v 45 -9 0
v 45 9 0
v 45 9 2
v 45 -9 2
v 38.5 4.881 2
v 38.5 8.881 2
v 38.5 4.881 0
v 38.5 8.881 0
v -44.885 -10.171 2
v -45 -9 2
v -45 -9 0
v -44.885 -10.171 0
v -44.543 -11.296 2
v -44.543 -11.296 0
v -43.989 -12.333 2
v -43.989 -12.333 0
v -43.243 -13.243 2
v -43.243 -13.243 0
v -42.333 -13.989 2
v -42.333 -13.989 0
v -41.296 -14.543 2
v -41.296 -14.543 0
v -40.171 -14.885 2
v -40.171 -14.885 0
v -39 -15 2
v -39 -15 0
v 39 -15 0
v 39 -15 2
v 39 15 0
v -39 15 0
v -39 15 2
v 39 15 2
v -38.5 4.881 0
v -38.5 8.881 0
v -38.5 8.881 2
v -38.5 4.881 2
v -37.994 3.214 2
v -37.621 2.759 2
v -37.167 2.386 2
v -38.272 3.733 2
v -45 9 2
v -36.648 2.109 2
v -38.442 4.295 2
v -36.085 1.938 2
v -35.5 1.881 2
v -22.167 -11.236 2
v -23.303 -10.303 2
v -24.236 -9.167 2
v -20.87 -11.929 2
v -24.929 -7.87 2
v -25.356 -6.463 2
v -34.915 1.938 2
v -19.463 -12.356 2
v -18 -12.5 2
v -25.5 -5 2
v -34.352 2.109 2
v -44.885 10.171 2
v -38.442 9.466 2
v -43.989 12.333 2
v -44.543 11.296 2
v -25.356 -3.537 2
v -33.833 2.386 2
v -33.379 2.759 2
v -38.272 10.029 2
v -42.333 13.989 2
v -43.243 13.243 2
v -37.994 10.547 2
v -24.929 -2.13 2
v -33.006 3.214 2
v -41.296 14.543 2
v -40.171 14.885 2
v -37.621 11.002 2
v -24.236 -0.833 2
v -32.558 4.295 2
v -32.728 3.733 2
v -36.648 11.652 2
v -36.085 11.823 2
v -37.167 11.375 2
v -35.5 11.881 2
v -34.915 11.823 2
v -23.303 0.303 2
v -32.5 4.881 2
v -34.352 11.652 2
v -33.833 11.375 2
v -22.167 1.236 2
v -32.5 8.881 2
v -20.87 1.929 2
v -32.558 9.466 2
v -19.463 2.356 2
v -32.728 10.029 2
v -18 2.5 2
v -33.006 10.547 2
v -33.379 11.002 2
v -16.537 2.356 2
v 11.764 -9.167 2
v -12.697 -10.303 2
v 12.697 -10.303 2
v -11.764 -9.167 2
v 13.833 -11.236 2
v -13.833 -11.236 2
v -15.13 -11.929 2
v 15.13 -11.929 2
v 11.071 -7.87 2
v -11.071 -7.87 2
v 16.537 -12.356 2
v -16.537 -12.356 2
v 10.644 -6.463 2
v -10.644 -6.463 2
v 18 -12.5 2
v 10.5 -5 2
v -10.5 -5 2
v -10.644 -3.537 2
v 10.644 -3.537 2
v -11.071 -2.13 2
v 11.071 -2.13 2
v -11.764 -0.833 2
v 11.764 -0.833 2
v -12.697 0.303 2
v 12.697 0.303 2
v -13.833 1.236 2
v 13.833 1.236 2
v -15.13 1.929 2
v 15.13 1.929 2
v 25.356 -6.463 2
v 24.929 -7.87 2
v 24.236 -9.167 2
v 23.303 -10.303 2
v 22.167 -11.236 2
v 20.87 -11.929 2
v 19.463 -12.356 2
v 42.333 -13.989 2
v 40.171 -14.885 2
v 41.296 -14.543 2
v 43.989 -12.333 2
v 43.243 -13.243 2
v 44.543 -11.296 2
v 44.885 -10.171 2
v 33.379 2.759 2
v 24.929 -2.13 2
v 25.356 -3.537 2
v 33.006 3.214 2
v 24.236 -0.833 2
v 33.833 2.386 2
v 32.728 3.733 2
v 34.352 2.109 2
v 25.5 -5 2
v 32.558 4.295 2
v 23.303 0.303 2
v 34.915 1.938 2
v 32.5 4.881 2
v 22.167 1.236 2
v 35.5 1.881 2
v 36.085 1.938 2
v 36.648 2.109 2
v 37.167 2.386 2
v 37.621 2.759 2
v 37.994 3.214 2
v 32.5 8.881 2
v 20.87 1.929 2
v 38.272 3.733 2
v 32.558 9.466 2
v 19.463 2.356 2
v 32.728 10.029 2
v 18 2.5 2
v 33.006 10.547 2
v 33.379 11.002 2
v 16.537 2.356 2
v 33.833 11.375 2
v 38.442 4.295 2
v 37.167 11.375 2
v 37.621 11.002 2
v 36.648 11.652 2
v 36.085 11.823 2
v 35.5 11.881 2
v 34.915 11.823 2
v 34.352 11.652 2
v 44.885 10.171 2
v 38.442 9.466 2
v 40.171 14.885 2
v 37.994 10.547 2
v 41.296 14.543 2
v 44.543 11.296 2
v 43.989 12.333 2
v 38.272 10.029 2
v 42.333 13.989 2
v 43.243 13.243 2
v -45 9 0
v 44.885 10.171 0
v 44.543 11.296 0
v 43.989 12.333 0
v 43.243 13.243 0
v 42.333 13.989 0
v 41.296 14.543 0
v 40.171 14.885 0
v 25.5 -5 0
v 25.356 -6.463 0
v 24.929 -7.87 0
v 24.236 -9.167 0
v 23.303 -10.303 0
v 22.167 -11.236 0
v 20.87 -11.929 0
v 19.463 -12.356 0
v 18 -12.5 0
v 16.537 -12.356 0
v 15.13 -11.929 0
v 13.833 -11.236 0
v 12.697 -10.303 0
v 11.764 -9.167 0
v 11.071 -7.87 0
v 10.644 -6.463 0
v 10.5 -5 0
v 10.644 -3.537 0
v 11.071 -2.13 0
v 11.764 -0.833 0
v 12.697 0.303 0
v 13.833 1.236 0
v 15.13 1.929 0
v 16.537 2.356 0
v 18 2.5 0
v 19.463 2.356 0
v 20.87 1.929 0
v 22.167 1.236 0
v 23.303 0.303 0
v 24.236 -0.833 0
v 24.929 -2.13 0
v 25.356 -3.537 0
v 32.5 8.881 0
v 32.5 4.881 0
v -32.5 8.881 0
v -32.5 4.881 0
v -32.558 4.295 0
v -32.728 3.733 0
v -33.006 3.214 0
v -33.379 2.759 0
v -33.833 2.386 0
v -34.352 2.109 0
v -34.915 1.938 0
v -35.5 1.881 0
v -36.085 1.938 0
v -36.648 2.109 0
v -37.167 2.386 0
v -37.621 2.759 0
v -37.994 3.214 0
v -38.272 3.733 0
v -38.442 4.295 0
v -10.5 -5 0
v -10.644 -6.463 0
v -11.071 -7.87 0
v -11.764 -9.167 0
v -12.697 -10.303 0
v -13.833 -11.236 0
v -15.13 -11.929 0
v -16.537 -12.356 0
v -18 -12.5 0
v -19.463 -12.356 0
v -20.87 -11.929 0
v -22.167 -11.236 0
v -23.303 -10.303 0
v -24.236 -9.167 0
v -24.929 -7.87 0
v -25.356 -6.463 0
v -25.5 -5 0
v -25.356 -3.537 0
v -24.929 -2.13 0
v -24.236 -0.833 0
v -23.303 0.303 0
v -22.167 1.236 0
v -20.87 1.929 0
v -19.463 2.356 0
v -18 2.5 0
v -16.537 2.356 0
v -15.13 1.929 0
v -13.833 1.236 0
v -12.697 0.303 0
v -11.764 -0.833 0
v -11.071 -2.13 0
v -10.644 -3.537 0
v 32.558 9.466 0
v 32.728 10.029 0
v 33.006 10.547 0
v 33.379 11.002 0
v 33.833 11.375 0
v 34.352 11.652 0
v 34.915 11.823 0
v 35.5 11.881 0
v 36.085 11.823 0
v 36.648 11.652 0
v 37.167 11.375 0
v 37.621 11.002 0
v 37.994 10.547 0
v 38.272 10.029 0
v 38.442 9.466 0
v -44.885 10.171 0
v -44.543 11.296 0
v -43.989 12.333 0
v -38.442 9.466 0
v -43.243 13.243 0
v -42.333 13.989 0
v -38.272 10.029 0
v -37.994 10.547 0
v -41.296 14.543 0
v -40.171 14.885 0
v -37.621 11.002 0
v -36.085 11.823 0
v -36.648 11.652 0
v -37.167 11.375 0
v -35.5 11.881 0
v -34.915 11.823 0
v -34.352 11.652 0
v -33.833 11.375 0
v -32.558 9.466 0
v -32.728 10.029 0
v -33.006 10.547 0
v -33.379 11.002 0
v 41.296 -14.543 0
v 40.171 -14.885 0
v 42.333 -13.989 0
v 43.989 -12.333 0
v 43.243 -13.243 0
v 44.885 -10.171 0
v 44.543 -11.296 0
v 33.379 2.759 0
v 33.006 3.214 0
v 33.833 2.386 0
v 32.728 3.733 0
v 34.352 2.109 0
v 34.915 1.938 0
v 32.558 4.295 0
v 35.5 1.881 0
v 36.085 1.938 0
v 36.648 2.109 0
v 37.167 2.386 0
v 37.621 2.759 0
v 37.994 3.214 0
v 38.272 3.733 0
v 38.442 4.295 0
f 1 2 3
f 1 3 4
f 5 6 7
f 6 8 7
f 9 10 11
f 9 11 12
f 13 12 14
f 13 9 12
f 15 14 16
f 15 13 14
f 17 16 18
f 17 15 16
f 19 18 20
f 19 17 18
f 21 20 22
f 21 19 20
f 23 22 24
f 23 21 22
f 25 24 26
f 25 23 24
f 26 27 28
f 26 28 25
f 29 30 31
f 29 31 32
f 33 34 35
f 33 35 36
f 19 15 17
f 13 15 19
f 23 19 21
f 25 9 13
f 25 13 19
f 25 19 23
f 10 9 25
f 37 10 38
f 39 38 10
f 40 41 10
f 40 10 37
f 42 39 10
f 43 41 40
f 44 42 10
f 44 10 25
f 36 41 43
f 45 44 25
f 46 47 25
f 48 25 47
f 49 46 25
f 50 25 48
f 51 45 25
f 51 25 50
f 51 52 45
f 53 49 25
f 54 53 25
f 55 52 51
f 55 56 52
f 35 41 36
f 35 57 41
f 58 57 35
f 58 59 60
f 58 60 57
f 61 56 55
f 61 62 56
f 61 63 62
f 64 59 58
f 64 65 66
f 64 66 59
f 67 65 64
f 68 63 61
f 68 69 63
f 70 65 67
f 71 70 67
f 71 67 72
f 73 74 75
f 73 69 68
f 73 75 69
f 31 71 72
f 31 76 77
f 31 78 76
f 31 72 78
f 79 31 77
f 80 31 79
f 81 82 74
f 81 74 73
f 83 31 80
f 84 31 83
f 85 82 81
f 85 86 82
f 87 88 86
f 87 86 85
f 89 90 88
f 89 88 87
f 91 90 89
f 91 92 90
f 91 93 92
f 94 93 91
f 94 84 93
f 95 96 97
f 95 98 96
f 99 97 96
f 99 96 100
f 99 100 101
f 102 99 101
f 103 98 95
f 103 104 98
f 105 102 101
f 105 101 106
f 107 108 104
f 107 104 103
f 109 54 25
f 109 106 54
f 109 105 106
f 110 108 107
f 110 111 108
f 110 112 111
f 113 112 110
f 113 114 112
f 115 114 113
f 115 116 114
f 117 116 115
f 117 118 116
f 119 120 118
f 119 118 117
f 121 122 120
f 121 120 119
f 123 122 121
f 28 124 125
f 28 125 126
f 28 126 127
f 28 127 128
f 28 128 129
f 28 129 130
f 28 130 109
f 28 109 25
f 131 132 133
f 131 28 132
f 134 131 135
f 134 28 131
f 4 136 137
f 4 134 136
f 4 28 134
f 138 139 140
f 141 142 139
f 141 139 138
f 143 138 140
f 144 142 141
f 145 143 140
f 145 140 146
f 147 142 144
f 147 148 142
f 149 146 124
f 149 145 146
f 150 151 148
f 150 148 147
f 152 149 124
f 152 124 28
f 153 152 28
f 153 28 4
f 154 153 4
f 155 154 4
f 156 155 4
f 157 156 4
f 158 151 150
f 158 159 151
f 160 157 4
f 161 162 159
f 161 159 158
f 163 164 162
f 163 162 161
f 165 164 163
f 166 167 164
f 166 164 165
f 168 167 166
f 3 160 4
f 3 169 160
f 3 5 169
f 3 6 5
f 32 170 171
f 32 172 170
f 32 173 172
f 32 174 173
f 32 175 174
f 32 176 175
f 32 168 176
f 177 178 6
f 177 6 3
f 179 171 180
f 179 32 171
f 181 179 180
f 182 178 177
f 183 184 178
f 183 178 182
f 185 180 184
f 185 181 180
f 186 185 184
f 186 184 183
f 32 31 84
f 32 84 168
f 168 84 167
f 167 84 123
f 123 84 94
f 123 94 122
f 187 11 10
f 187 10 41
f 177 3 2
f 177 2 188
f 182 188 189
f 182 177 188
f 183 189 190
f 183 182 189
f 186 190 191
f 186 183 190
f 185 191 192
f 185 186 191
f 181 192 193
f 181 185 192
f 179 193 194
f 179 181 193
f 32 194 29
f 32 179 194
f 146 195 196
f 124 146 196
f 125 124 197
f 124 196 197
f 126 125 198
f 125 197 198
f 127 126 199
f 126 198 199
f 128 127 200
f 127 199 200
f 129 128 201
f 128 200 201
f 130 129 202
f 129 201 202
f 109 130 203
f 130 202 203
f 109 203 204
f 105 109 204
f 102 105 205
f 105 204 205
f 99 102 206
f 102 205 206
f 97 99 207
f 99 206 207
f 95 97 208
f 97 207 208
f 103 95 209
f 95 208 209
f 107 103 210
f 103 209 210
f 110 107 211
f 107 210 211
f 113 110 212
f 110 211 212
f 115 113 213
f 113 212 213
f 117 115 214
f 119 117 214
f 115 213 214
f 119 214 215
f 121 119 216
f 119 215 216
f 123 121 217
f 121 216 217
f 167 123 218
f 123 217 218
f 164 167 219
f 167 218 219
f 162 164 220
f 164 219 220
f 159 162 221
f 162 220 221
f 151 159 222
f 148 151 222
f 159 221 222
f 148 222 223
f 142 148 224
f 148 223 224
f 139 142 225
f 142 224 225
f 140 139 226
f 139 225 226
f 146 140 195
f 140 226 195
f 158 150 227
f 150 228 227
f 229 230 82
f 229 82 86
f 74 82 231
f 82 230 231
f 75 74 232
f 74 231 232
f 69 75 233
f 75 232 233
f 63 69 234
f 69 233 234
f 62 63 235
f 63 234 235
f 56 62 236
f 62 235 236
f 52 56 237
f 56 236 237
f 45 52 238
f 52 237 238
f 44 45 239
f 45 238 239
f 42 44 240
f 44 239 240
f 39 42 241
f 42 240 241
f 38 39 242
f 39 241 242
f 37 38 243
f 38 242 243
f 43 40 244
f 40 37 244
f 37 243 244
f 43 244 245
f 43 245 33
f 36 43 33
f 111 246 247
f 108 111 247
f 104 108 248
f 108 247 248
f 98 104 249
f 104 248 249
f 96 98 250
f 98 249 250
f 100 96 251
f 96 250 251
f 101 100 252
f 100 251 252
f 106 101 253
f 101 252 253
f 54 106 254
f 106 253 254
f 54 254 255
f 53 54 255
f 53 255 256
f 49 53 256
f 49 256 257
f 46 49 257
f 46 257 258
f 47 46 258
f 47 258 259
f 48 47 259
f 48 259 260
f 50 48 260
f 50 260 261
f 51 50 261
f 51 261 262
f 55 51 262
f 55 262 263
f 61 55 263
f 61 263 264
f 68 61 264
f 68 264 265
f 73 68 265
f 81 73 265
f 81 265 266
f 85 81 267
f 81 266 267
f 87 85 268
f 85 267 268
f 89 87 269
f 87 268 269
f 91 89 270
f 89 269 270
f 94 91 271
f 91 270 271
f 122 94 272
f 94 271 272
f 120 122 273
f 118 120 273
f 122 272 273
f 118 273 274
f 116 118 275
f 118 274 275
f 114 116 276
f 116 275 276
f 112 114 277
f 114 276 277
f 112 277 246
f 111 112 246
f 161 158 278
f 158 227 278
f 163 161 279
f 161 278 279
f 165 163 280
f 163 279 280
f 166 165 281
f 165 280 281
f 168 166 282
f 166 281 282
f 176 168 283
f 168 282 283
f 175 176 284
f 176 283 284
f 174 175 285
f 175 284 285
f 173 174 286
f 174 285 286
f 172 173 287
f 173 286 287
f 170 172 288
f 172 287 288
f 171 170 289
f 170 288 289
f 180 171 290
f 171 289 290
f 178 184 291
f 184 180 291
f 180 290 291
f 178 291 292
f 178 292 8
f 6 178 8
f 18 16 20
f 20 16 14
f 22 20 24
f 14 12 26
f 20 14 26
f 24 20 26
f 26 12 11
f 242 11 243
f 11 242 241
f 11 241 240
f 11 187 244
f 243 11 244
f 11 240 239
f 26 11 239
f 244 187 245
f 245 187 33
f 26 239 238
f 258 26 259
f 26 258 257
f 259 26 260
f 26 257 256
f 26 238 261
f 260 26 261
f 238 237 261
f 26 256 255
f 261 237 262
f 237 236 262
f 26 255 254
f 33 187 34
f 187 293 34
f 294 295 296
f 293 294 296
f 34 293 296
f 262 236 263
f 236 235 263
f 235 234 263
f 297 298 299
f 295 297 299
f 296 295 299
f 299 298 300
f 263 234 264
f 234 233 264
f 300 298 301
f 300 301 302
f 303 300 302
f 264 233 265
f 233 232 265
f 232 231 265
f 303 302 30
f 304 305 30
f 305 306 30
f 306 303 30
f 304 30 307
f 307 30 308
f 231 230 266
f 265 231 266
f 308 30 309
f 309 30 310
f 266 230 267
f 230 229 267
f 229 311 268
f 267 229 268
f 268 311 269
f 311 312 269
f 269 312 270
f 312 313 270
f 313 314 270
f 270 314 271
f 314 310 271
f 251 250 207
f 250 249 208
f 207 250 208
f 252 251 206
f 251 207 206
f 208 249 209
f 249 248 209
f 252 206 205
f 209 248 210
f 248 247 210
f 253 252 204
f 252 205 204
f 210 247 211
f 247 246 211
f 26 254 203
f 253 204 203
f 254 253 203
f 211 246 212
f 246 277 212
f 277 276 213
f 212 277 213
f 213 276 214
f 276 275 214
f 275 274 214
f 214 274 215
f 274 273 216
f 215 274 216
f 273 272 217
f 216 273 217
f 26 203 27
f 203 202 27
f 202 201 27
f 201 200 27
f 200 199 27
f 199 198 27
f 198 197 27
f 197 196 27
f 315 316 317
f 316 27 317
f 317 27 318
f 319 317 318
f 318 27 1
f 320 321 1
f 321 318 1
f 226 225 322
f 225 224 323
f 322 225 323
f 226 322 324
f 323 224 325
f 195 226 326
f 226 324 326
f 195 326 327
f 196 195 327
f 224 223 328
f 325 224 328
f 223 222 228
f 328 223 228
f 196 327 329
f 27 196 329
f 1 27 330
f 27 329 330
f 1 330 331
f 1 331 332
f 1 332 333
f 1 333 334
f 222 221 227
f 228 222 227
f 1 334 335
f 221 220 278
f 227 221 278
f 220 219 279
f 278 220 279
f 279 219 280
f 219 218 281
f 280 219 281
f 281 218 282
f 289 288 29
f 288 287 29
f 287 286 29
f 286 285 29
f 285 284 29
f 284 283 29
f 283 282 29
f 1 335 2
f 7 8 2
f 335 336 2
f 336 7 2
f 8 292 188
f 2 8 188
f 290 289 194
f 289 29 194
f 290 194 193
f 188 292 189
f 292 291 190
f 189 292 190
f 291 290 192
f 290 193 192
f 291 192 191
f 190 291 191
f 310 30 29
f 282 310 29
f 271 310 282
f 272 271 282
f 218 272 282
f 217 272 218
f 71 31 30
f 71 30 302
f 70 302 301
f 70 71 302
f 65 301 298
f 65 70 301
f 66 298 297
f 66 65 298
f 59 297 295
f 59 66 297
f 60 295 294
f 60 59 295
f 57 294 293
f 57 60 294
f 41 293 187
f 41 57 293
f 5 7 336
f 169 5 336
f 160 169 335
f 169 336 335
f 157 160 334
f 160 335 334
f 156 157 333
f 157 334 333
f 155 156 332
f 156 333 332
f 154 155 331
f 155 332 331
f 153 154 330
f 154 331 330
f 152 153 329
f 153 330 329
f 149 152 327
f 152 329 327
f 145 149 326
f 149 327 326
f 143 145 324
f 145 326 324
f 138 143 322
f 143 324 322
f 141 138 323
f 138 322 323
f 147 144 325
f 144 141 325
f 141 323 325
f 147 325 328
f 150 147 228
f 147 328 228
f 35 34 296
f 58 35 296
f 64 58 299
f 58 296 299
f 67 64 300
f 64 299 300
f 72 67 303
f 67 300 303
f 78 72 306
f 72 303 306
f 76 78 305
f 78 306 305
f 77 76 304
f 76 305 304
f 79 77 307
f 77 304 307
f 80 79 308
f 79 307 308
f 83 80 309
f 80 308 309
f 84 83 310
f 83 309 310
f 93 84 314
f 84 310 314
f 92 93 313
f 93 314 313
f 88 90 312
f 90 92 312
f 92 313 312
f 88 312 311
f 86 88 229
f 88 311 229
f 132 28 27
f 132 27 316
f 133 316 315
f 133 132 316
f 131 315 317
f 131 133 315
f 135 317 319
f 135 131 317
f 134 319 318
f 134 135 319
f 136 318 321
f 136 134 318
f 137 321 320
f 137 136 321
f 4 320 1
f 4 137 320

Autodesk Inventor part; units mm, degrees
ref_plane "YZ Plane" through (0, 0, 0) normal (1, 0, 0) x (0, 1, 0)
ref_plane "XZ Plane" through (0, 0, 0) normal (0, 1, 0) x (-1, 0, 0)
ref_plane "XY Plane" through (0, 0, 0) normal (0, 0, 1) x (1, 0, 0)
sketch "Sketch1" plane through (0, 0, 0) normal (0, 0, 1) x (1, 0, 0)
  line L0 (-45, 15) -> (45, 15)
  line L1 (45, 15) -> (45, -15)
  line L2 (45, -15) -> (-45, -15)
  line L3 (-45, -15) -> (-45, 15)
  line L4 (-45, 15) -> (45, -15) construction
  line L5 (45, 15) -> (-45, -15) construction
  circle A0 centre (18, -5) radius 7.5
  circle A1 centre (-18, -5) radius 7.5
  line L6 (0, 15) -> (0, -15) construction
  line L7 (25.5, -5) -> (25.5, -15)
  line L8 (10.5, -5) -> (10.5, -15)
  line L9 (-10.5, -5) -> (-10.5, -15)
  line L10 (-25.5, -5) -> (-25.5, -15)
  line L11 (35.5, 8.8807) -> (35.5, 4.8807) construction
  line L12 (38.5, 8.8807) -> (38.5, 4.8807)
  line L13 (32.5, 4.8807) -> (32.5, 8.8807)
  arc A2 (38.5, 8.8807) -> (32.5, 8.8807) centre (35.5, 8.8807) ccw
  arc A3 (32.5, 4.8807) -> (38.5, 4.8807) centre (35.5, 4.8807) ccw
  line L14 (-35.5, 8.8807) -> (-35.5, 4.8807) construction
  line L15 (-38.5, 8.8807) -> (-38.5, 4.8807)
  line L16 (-32.5, 4.8807) -> (-32.5, 8.8807)
  arc A4 (-32.5, 8.8807) -> (-38.5, 8.8807) centre (-35.5, 8.8807) ccw
  arc A5 (-38.5, 4.8807) -> (-32.5, 4.8807) centre (-35.5, 4.8807) ccw
  point P0 (0, 0)
  point P1 (0, 0)
  point P2 (35.5, 6.8807)
  point P3 (-35.5, 6.8807)
  dimension "d0" = 90
  dimension "d1" = 30
  dimension "d2" = 15
  dimension "d3" = 36
  dimension "d6" = 10
  dimension "d7" = 6
  dimension "d8" = 4
  dimension "d9" = 71
extrude "Plate1" add sketch "Sketch1" along normal blind 2 contours L0 L1 L2 L7 A0 L8 L9 A1 L10 L3 | L10 A1 L9 L2 | L2 L8 A0 L7
fillet "Corner Round1" radius 6 4 edges at (-45, 15, 1) (-45, -15, 1) (45, 15, 1) (45, -15, 1)
equation "\"d4\" = Thickness"
equation "\"BendRadius\" = Thickness"
equation "\"BendReliefWidth\" = Thickness"
equation "\"BendReliefDepth\" = 0.5 * Thickness"
equation "\"CornerReliefSize\" = 4 * Thickness"
equation "\"MinimumRemnant\" = 2 * Thickness"
equation "\"TransitionRadius\" = BendRadius"
equation "\"JacobiRadiusSize\" = BendRadius"
equation "\"GapSize\" = Thickness"
equation "\"Thickness\" = 2"
properties part number "motor pillar 4"
